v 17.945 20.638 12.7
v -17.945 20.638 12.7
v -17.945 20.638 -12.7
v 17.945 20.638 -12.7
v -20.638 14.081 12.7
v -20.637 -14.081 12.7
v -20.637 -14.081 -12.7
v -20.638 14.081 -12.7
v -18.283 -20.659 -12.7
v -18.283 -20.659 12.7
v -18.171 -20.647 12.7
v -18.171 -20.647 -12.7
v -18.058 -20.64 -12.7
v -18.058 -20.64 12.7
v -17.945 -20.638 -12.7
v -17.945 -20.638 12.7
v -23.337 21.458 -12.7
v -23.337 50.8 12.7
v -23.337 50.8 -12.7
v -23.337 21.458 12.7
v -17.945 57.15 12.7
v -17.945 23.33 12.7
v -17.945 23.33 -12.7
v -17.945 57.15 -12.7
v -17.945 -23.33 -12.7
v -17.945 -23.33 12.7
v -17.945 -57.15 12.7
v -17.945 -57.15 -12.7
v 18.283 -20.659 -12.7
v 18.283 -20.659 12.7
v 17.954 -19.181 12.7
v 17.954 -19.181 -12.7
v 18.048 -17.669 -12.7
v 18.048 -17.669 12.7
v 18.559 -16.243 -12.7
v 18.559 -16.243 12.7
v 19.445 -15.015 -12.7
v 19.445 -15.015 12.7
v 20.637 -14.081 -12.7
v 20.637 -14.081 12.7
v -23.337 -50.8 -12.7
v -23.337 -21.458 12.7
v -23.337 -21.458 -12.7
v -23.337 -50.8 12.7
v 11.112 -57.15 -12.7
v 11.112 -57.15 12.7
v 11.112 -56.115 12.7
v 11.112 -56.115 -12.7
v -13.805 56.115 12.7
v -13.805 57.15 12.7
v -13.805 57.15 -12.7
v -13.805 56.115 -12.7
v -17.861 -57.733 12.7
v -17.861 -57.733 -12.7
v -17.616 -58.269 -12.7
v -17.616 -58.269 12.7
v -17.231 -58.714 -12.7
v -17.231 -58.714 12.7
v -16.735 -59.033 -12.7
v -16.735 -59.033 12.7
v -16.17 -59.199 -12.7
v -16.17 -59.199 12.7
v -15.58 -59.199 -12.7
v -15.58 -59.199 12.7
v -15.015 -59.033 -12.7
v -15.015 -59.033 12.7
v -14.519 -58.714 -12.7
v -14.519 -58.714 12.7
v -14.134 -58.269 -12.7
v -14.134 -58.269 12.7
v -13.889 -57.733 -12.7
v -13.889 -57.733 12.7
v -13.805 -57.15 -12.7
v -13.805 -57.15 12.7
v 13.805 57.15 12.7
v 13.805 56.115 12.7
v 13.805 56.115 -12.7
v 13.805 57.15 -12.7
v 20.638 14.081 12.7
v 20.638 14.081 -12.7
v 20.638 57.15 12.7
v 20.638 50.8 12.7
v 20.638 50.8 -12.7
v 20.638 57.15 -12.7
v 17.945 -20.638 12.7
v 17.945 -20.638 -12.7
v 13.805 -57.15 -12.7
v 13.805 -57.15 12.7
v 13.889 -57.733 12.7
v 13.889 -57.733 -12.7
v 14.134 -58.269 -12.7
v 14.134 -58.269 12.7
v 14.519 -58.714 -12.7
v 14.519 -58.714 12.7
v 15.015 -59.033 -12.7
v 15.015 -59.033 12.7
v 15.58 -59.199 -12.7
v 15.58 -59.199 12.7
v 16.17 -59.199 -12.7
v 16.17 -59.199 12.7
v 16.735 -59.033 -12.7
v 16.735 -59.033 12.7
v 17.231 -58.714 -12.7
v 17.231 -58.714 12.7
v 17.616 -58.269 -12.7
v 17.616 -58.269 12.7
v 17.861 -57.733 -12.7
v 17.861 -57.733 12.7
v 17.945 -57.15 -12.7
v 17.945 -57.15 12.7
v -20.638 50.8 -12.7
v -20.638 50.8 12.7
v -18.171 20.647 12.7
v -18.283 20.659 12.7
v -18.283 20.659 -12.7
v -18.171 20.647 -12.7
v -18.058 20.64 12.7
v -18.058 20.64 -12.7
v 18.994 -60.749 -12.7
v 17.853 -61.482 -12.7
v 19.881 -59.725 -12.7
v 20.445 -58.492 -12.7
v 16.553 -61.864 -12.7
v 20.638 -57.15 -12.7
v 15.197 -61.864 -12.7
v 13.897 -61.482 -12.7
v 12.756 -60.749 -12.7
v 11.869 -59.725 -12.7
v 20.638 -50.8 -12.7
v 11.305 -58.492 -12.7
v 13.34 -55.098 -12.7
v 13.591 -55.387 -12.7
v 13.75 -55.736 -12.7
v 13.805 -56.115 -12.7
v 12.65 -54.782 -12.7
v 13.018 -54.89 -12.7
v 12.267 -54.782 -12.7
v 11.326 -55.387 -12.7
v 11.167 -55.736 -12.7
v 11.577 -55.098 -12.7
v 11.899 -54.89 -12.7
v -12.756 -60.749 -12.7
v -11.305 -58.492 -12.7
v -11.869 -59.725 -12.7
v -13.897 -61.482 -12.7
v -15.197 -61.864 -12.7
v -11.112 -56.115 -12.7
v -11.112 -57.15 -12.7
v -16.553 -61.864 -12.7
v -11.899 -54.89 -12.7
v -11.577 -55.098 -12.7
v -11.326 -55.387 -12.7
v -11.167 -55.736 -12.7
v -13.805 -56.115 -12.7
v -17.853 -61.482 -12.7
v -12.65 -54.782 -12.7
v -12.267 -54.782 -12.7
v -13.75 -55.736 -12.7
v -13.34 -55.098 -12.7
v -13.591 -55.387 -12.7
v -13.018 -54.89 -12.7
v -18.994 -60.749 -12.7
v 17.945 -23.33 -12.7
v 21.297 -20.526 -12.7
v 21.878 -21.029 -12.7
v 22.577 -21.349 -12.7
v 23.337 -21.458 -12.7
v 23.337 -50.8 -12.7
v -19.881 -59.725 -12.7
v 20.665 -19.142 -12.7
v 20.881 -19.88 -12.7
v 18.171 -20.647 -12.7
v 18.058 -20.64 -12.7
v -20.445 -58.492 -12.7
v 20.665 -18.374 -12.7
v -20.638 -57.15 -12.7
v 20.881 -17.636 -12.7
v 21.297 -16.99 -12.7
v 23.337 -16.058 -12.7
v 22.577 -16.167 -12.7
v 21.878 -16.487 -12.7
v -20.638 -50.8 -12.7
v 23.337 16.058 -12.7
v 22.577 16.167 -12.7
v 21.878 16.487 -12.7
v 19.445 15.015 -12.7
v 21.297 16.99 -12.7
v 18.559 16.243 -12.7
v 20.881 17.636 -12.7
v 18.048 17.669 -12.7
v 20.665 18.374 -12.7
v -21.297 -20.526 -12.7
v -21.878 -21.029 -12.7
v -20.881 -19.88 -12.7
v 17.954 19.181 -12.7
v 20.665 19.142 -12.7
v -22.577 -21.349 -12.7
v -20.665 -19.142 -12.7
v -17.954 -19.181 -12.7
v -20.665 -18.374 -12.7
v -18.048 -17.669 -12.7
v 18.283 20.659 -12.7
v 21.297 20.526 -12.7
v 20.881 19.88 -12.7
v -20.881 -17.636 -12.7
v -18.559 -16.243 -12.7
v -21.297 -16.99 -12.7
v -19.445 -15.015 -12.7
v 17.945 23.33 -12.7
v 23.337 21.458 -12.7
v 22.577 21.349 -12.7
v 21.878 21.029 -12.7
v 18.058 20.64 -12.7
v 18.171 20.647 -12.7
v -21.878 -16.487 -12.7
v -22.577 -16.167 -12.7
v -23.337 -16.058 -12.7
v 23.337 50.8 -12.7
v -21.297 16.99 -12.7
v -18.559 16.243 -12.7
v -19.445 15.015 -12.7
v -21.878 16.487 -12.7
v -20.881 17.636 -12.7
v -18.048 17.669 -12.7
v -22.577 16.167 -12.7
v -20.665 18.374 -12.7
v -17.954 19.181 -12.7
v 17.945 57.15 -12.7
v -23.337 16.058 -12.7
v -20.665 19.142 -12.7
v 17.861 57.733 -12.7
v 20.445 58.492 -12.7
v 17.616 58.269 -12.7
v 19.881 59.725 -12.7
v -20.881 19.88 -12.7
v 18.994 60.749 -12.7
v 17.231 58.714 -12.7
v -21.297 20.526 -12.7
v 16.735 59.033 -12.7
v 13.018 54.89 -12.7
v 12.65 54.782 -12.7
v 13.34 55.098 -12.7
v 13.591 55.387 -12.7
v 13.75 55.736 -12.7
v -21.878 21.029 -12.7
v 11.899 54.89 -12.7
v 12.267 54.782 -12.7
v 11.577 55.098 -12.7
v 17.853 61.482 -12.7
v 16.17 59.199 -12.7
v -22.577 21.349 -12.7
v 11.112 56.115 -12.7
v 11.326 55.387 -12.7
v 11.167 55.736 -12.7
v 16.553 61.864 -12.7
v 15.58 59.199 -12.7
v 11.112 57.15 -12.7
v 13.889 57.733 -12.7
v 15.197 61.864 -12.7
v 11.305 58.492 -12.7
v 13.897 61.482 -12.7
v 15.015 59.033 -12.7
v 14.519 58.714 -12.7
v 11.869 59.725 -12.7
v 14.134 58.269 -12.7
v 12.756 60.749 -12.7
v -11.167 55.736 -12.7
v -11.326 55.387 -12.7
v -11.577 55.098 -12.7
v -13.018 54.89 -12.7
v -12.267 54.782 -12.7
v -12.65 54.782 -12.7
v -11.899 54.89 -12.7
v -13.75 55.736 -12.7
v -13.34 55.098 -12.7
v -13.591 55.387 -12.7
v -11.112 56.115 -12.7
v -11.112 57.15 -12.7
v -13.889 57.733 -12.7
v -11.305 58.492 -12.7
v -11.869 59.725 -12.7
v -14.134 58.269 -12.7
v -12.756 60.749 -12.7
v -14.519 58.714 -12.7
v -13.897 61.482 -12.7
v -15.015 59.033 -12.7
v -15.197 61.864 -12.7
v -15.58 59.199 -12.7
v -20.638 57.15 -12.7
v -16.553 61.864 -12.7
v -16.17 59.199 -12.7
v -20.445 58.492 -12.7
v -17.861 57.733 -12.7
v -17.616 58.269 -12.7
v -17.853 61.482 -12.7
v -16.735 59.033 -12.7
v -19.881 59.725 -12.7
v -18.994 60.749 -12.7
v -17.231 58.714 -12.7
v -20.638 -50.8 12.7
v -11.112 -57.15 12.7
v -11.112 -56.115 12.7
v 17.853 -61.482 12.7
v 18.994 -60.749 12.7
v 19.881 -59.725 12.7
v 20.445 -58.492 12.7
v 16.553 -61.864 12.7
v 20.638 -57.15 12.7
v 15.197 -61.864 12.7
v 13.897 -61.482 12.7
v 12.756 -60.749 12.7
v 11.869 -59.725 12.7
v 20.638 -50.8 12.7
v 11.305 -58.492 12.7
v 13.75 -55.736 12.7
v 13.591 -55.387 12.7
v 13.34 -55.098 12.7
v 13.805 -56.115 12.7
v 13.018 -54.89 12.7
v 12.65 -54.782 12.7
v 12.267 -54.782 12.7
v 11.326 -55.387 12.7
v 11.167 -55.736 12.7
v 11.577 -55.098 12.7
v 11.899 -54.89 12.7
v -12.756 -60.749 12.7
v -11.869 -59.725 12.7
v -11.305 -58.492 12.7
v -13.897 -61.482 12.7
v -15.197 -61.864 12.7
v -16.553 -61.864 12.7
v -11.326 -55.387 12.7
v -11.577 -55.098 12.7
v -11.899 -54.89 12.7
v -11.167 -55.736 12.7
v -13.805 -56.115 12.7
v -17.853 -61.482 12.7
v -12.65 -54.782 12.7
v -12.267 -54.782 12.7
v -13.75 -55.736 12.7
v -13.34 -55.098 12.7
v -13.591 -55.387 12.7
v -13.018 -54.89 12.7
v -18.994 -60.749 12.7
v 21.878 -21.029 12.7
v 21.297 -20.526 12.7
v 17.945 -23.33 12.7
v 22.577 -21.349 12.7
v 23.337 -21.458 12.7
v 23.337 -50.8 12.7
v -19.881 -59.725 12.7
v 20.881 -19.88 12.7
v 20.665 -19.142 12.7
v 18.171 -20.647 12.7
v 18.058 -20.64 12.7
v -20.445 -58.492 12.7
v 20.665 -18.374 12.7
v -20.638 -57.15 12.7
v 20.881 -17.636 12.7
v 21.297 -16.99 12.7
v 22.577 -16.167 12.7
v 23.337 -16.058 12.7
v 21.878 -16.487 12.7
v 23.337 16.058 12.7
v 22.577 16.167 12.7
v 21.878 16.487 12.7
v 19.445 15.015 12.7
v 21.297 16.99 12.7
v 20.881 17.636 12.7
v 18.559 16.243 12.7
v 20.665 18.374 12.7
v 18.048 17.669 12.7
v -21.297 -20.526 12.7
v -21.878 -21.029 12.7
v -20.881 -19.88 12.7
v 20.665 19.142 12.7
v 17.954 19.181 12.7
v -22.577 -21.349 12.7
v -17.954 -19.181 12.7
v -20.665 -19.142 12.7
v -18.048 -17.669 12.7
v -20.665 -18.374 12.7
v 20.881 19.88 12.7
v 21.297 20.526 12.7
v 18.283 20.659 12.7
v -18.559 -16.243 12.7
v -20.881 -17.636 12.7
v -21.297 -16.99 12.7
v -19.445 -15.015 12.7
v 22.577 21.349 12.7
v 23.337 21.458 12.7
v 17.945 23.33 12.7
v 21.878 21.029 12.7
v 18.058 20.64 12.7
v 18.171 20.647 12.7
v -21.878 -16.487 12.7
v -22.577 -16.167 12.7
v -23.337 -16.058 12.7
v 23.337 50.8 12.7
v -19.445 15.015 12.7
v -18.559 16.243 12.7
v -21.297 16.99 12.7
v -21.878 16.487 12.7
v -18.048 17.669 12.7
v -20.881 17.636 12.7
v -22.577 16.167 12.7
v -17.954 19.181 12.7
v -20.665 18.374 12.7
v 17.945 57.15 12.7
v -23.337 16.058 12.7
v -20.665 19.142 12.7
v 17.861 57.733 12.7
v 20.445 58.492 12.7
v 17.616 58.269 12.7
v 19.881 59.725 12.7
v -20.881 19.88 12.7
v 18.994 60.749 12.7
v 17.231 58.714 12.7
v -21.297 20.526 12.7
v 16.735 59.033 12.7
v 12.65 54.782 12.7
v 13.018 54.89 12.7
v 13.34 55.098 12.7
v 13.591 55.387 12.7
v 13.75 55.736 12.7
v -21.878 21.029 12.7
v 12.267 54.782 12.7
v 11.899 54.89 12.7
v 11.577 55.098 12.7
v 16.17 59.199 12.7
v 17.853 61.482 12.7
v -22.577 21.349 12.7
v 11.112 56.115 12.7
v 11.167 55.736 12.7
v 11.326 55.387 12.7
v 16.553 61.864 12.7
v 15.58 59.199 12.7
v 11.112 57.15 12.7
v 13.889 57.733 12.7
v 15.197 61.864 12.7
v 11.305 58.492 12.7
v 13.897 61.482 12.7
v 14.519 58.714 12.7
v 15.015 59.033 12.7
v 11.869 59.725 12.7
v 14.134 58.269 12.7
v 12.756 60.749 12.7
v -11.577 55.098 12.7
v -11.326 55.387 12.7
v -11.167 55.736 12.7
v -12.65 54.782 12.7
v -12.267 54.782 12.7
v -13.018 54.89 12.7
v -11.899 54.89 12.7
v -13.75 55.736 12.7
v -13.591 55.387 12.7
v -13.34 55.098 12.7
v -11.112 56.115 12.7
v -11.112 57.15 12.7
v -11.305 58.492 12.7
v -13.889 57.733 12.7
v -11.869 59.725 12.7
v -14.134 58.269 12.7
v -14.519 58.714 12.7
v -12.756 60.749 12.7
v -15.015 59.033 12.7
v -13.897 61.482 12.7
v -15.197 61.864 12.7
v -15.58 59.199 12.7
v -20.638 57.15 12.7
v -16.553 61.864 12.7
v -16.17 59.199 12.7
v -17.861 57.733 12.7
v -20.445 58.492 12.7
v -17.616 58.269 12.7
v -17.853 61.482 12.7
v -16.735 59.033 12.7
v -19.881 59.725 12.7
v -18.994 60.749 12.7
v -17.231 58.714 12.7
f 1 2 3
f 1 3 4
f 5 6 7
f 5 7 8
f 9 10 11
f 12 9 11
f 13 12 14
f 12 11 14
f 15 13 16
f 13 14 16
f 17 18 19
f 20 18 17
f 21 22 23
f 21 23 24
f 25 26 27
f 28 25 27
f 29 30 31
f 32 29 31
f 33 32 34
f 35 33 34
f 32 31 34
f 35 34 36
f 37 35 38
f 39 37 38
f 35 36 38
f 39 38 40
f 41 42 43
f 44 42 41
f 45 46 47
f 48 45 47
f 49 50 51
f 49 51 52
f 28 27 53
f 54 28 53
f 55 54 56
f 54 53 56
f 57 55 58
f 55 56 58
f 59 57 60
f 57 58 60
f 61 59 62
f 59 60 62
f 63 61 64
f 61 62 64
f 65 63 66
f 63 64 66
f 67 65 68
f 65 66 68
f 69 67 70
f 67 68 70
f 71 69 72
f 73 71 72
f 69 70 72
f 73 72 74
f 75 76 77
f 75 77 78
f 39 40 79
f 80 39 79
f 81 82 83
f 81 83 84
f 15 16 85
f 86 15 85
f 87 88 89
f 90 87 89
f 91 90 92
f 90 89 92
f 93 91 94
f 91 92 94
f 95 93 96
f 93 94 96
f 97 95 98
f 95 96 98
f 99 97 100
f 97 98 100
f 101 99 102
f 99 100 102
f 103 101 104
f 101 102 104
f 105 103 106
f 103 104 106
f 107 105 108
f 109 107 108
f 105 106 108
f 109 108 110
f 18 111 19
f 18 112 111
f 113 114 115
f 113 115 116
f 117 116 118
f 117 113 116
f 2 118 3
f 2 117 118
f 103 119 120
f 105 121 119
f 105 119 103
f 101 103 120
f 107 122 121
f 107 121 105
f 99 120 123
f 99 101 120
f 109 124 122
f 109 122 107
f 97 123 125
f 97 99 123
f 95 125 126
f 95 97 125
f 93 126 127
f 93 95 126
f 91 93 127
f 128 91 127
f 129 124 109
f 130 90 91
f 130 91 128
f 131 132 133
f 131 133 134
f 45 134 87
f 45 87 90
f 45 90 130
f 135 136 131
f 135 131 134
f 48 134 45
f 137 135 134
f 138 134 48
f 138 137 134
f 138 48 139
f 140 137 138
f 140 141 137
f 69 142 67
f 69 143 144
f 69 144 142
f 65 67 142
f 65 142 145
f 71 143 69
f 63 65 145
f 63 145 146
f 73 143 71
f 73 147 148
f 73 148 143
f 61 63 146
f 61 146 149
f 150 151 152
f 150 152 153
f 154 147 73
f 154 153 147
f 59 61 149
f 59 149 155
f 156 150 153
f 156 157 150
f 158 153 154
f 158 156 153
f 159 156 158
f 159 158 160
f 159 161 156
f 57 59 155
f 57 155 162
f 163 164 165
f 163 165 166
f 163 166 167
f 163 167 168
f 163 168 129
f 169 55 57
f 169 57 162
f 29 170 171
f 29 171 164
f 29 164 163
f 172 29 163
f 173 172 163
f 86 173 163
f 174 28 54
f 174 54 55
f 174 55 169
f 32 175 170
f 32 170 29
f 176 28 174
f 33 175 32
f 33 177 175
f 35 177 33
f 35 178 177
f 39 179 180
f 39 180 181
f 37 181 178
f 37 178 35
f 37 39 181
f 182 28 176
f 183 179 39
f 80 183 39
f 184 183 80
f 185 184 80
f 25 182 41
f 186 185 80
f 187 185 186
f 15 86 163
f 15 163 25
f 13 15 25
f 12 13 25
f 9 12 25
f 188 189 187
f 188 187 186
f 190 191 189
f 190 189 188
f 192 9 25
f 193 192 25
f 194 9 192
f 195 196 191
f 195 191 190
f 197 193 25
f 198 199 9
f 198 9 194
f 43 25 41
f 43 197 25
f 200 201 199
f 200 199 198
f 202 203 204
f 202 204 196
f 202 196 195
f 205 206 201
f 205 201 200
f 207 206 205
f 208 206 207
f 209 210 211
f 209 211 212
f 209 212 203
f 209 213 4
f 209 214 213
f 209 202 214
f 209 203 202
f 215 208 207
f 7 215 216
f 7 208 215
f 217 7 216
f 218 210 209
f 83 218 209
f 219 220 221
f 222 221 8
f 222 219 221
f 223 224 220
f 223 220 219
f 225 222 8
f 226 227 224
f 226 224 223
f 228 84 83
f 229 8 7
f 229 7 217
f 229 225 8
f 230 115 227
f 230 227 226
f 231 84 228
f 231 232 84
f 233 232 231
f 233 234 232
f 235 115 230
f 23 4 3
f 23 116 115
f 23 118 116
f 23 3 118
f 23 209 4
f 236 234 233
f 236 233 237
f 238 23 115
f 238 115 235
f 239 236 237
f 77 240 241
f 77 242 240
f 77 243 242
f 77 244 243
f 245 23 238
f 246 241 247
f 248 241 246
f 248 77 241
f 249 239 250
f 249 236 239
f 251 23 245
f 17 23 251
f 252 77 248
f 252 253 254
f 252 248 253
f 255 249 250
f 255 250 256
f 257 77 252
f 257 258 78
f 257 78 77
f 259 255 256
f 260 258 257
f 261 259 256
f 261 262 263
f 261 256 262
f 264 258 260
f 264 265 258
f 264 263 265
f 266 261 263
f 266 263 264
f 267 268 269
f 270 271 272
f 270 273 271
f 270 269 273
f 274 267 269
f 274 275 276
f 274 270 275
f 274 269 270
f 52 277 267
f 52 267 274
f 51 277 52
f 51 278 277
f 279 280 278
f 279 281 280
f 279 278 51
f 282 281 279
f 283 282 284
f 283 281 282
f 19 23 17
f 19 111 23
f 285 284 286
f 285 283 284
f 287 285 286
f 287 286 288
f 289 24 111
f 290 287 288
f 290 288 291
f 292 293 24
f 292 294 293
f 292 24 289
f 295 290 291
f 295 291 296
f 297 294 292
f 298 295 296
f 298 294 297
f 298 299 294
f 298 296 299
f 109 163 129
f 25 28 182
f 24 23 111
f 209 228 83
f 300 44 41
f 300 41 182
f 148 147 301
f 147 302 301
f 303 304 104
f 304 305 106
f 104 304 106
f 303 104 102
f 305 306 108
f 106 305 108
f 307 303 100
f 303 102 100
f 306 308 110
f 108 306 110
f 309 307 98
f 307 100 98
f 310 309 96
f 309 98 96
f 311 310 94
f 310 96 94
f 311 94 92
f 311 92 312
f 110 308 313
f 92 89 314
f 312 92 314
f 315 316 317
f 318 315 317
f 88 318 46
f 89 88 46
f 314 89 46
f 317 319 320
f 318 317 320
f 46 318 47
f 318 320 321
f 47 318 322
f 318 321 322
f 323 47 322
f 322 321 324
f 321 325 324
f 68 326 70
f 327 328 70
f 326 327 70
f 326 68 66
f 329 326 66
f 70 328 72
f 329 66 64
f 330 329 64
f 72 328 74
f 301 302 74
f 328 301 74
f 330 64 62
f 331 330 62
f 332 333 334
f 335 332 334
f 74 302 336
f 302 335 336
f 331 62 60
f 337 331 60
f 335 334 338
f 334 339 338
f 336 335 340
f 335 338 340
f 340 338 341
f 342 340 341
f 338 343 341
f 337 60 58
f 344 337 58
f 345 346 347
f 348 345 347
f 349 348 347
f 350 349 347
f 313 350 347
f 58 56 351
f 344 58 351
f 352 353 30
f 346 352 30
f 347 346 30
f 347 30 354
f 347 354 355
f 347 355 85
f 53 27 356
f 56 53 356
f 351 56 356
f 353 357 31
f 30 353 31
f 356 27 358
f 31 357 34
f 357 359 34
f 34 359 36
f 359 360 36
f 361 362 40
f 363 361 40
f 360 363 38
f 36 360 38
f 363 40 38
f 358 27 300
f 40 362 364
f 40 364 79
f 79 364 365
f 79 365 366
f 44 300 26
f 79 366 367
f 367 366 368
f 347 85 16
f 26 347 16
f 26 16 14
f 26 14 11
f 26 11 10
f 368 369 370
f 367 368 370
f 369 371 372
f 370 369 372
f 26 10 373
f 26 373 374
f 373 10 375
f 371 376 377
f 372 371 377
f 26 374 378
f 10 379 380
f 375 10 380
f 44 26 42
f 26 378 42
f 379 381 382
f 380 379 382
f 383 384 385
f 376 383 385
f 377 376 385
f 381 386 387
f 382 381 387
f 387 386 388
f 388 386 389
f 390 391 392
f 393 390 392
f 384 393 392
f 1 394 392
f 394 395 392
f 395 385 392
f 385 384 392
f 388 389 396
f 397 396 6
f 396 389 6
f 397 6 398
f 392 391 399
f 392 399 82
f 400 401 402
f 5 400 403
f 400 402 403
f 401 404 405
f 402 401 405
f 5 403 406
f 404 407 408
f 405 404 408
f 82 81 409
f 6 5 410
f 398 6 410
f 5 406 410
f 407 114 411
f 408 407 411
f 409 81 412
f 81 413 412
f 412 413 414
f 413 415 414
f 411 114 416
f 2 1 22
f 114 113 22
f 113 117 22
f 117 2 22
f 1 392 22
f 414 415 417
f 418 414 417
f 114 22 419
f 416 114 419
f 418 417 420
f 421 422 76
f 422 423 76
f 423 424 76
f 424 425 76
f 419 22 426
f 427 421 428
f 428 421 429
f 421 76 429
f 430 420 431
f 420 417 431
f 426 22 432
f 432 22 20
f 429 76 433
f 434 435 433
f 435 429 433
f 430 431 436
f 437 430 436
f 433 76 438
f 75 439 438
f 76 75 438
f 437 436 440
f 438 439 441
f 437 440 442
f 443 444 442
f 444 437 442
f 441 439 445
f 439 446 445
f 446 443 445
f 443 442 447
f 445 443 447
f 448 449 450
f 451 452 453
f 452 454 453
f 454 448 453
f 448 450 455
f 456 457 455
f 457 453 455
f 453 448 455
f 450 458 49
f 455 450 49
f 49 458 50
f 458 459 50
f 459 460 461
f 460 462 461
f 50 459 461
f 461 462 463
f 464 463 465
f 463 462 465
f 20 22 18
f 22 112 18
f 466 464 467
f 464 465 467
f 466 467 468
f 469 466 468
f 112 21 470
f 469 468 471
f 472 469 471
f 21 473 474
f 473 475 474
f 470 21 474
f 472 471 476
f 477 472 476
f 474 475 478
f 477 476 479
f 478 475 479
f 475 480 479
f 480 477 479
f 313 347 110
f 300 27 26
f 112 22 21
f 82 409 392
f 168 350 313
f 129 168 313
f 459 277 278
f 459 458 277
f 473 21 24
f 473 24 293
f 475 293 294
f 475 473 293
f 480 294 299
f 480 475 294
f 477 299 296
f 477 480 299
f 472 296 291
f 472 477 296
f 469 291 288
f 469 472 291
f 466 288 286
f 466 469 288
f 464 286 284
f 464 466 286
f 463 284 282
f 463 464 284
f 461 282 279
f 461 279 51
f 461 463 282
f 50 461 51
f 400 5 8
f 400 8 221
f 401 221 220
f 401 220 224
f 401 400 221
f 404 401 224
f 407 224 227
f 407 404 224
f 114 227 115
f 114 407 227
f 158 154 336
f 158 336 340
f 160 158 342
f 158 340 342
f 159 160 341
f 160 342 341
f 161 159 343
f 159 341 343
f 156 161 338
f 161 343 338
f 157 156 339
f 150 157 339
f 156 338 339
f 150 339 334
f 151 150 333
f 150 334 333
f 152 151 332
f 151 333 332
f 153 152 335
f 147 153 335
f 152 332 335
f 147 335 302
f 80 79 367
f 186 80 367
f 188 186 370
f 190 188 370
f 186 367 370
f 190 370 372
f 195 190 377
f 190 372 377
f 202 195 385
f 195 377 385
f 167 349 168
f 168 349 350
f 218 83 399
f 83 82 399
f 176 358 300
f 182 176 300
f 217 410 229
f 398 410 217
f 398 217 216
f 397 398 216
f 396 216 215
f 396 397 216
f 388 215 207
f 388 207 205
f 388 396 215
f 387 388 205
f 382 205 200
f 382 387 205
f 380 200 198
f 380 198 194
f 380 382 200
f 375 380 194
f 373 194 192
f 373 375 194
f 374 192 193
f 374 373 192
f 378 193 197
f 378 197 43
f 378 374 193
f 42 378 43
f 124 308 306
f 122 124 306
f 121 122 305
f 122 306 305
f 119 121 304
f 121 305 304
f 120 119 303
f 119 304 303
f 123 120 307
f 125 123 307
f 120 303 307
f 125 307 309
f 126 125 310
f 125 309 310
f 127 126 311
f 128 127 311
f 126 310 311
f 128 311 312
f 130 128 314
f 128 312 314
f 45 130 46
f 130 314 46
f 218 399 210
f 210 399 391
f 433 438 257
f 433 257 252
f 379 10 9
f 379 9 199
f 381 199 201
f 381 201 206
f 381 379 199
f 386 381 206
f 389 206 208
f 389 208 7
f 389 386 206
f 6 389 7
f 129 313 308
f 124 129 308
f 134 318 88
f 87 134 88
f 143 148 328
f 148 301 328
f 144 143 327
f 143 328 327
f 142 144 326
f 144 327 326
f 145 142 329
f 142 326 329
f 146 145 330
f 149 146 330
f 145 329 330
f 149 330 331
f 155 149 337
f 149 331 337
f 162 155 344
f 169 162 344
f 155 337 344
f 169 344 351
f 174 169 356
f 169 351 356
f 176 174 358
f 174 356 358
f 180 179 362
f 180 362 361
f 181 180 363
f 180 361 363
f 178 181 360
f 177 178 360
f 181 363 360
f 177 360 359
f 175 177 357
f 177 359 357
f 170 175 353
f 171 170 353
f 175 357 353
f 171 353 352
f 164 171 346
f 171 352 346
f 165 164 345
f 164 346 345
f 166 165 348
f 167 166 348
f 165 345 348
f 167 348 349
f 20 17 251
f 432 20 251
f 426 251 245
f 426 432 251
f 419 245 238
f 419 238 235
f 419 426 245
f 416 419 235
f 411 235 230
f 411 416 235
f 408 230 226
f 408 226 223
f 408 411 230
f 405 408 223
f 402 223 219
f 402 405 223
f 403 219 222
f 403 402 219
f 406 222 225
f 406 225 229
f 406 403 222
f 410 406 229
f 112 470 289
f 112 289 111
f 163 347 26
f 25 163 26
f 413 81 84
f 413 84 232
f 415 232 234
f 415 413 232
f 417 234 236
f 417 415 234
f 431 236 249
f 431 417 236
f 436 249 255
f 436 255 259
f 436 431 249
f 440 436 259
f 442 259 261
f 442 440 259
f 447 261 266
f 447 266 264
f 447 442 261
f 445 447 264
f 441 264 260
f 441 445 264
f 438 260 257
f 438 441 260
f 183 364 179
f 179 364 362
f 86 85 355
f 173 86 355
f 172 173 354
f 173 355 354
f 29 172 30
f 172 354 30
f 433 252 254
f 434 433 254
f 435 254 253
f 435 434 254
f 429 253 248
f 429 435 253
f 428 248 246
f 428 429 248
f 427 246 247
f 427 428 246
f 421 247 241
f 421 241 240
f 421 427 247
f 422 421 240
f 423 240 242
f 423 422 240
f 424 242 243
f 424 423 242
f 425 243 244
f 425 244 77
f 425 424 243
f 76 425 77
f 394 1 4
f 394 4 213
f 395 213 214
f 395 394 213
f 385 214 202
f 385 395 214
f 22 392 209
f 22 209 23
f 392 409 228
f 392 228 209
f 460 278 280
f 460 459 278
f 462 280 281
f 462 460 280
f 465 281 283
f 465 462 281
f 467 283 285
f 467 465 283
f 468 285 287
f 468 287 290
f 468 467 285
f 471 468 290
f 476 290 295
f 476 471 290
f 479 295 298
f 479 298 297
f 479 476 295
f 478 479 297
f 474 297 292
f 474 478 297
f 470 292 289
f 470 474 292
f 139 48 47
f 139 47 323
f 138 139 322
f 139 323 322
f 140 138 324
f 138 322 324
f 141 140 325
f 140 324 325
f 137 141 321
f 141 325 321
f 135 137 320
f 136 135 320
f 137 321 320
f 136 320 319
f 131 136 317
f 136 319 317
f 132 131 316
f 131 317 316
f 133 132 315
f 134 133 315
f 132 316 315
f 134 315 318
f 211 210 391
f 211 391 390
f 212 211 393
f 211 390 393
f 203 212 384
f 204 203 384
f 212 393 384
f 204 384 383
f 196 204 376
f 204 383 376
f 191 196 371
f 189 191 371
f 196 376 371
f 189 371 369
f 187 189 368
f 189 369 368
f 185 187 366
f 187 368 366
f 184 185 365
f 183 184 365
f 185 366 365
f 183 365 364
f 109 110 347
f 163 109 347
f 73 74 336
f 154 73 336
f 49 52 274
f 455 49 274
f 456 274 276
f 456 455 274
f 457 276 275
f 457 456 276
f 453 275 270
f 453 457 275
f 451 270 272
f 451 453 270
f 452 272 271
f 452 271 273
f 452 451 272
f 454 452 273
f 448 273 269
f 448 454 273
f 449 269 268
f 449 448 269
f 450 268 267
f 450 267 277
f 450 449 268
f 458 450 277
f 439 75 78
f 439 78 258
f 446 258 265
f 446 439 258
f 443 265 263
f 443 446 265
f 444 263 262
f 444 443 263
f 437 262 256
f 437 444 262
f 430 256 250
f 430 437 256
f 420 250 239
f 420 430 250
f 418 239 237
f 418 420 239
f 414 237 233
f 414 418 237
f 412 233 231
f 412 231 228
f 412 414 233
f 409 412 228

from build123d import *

# Parameters (mm, degrees)
BASE_EXTRUDE_DEPTH  = 12.7
BOSS_EXTRUDE1_DEPTH = 12.7


with BuildPart() as part:
    # Sketch1 → Base-Extrude (new, symmetric)
    with BuildSketch(Plane(origin=(0, 33.02, 0), x_dir=(1, 0, 0), z_dir=(0, 0, 1))):
        with BuildLine():
            Line((-20.6375, 24.13), (-20.6375, -9.6901))
            ThreePointArc((-20.6375, -9.6901), (-19.848914298, -11.593914298), (-17.9451, -12.3825))
            Line((-17.9451, -12.3825), (17.9451, -12.3825))
            ThreePointArc((17.9451, -12.3825), (19.848914298, -11.593914298), (20.6375, -9.6901))
            Line((20.6375, -9.6901), (20.6375, 24.13))
            ThreePointArc((20.6375, 24.13), (15.875, 28.8925), (11.1125, 24.13))
            Line((11.1125, 24.13), (11.1125, 23.09495))
            ThreePointArc((11.1125, 23.09495), (12.4587, 21.74875), (13.8049, 23.09495))
            Line((13.8049, 23.09495), (13.8049, 24.13))
            ThreePointArc((13.8049, 24.13), (15.875, 26.2001), (17.9451, 24.13))
            Line((17.9451, 24.13), (17.9451, -9.6901))
            Line((17.9451, -9.6901), (-17.9451, -9.6901))
            Line((-17.9451, -9.6901), (-17.9451, 24.13))
            ThreePointArc((-17.9451, 24.13), (-15.875, 26.2001), (-13.8049, 24.13))
            Line((-13.8049, 24.13), (-13.8049, 23.09495))
            ThreePointArc((-13.8049, 23.09495), (-12.4587, 21.74875), (-11.1125, 23.09495))
            Line((-11.1125, 23.09495), (-11.1125, 24.13))
            ThreePointArc((-11.1125, 24.13), (-15.875, 28.8925), (-20.6375, 24.13))
        make_face()
    base_extrude = extrude(amount=BASE_EXTRUDE_DEPTH, both=True)

    # Sketch2 → Boss-Extrude1 (add, symmetric)
    with BuildSketch(Plane.XY):
        with BuildLine():
            Line((-23.337499985, 50.8), (-23.337499985, 21.457899985))
            ThreePointArc((-23.337499985, 21.457899985), (-20.6375, 18.7579), (-23.337499985, 16.057900015))
            Line((-23.337499985, 16.057900015), (-23.337499985, -16.057900015))
            ThreePointArc((-23.337499985, -16.057900015), (-20.6375, -18.7579), (-23.337499985, -21.457899985))
            Line((-23.337499985, -21.457899985), (-23.337499985, -50.8))
            Line((-23.337499985, -50.8), (-20.6375, -50.8))
            Line((-20.6375, -50.8), (-20.6375, -23.434437154))
            ThreePointArc((-20.6375, -23.434437154), (-17.937500015, -18.7579), (-20.6375, -14.081362846))
            Line((-20.6375, -14.081362846), (-20.6375, 14.081362846))
            ThreePointArc((-20.6375, 14.081362846), (-17.937500015, 18.7579), (-20.6375, 23.434437154))
            Line((-20.6375, 23.434437154), (-20.6375, 50.8))
            Line((-20.6375, 50.8), (-23.337499985, 50.8))
        make_face()
    boss_extrude1 = extrude(amount=BOSS_EXTRUDE1_DEPTH, both=True)

    # Mirror1: Base-Extrude across plane
    add(base_extrude.mirror(Plane.ZX))

    # Mirror2: Boss-Extrude1 across plane
    add(boss_extrude1.mirror(Plane(origin=(0, 0, 0), x_dir=(0, 0, 1), z_dir=(1, 0, 0))))


solid = part.part
